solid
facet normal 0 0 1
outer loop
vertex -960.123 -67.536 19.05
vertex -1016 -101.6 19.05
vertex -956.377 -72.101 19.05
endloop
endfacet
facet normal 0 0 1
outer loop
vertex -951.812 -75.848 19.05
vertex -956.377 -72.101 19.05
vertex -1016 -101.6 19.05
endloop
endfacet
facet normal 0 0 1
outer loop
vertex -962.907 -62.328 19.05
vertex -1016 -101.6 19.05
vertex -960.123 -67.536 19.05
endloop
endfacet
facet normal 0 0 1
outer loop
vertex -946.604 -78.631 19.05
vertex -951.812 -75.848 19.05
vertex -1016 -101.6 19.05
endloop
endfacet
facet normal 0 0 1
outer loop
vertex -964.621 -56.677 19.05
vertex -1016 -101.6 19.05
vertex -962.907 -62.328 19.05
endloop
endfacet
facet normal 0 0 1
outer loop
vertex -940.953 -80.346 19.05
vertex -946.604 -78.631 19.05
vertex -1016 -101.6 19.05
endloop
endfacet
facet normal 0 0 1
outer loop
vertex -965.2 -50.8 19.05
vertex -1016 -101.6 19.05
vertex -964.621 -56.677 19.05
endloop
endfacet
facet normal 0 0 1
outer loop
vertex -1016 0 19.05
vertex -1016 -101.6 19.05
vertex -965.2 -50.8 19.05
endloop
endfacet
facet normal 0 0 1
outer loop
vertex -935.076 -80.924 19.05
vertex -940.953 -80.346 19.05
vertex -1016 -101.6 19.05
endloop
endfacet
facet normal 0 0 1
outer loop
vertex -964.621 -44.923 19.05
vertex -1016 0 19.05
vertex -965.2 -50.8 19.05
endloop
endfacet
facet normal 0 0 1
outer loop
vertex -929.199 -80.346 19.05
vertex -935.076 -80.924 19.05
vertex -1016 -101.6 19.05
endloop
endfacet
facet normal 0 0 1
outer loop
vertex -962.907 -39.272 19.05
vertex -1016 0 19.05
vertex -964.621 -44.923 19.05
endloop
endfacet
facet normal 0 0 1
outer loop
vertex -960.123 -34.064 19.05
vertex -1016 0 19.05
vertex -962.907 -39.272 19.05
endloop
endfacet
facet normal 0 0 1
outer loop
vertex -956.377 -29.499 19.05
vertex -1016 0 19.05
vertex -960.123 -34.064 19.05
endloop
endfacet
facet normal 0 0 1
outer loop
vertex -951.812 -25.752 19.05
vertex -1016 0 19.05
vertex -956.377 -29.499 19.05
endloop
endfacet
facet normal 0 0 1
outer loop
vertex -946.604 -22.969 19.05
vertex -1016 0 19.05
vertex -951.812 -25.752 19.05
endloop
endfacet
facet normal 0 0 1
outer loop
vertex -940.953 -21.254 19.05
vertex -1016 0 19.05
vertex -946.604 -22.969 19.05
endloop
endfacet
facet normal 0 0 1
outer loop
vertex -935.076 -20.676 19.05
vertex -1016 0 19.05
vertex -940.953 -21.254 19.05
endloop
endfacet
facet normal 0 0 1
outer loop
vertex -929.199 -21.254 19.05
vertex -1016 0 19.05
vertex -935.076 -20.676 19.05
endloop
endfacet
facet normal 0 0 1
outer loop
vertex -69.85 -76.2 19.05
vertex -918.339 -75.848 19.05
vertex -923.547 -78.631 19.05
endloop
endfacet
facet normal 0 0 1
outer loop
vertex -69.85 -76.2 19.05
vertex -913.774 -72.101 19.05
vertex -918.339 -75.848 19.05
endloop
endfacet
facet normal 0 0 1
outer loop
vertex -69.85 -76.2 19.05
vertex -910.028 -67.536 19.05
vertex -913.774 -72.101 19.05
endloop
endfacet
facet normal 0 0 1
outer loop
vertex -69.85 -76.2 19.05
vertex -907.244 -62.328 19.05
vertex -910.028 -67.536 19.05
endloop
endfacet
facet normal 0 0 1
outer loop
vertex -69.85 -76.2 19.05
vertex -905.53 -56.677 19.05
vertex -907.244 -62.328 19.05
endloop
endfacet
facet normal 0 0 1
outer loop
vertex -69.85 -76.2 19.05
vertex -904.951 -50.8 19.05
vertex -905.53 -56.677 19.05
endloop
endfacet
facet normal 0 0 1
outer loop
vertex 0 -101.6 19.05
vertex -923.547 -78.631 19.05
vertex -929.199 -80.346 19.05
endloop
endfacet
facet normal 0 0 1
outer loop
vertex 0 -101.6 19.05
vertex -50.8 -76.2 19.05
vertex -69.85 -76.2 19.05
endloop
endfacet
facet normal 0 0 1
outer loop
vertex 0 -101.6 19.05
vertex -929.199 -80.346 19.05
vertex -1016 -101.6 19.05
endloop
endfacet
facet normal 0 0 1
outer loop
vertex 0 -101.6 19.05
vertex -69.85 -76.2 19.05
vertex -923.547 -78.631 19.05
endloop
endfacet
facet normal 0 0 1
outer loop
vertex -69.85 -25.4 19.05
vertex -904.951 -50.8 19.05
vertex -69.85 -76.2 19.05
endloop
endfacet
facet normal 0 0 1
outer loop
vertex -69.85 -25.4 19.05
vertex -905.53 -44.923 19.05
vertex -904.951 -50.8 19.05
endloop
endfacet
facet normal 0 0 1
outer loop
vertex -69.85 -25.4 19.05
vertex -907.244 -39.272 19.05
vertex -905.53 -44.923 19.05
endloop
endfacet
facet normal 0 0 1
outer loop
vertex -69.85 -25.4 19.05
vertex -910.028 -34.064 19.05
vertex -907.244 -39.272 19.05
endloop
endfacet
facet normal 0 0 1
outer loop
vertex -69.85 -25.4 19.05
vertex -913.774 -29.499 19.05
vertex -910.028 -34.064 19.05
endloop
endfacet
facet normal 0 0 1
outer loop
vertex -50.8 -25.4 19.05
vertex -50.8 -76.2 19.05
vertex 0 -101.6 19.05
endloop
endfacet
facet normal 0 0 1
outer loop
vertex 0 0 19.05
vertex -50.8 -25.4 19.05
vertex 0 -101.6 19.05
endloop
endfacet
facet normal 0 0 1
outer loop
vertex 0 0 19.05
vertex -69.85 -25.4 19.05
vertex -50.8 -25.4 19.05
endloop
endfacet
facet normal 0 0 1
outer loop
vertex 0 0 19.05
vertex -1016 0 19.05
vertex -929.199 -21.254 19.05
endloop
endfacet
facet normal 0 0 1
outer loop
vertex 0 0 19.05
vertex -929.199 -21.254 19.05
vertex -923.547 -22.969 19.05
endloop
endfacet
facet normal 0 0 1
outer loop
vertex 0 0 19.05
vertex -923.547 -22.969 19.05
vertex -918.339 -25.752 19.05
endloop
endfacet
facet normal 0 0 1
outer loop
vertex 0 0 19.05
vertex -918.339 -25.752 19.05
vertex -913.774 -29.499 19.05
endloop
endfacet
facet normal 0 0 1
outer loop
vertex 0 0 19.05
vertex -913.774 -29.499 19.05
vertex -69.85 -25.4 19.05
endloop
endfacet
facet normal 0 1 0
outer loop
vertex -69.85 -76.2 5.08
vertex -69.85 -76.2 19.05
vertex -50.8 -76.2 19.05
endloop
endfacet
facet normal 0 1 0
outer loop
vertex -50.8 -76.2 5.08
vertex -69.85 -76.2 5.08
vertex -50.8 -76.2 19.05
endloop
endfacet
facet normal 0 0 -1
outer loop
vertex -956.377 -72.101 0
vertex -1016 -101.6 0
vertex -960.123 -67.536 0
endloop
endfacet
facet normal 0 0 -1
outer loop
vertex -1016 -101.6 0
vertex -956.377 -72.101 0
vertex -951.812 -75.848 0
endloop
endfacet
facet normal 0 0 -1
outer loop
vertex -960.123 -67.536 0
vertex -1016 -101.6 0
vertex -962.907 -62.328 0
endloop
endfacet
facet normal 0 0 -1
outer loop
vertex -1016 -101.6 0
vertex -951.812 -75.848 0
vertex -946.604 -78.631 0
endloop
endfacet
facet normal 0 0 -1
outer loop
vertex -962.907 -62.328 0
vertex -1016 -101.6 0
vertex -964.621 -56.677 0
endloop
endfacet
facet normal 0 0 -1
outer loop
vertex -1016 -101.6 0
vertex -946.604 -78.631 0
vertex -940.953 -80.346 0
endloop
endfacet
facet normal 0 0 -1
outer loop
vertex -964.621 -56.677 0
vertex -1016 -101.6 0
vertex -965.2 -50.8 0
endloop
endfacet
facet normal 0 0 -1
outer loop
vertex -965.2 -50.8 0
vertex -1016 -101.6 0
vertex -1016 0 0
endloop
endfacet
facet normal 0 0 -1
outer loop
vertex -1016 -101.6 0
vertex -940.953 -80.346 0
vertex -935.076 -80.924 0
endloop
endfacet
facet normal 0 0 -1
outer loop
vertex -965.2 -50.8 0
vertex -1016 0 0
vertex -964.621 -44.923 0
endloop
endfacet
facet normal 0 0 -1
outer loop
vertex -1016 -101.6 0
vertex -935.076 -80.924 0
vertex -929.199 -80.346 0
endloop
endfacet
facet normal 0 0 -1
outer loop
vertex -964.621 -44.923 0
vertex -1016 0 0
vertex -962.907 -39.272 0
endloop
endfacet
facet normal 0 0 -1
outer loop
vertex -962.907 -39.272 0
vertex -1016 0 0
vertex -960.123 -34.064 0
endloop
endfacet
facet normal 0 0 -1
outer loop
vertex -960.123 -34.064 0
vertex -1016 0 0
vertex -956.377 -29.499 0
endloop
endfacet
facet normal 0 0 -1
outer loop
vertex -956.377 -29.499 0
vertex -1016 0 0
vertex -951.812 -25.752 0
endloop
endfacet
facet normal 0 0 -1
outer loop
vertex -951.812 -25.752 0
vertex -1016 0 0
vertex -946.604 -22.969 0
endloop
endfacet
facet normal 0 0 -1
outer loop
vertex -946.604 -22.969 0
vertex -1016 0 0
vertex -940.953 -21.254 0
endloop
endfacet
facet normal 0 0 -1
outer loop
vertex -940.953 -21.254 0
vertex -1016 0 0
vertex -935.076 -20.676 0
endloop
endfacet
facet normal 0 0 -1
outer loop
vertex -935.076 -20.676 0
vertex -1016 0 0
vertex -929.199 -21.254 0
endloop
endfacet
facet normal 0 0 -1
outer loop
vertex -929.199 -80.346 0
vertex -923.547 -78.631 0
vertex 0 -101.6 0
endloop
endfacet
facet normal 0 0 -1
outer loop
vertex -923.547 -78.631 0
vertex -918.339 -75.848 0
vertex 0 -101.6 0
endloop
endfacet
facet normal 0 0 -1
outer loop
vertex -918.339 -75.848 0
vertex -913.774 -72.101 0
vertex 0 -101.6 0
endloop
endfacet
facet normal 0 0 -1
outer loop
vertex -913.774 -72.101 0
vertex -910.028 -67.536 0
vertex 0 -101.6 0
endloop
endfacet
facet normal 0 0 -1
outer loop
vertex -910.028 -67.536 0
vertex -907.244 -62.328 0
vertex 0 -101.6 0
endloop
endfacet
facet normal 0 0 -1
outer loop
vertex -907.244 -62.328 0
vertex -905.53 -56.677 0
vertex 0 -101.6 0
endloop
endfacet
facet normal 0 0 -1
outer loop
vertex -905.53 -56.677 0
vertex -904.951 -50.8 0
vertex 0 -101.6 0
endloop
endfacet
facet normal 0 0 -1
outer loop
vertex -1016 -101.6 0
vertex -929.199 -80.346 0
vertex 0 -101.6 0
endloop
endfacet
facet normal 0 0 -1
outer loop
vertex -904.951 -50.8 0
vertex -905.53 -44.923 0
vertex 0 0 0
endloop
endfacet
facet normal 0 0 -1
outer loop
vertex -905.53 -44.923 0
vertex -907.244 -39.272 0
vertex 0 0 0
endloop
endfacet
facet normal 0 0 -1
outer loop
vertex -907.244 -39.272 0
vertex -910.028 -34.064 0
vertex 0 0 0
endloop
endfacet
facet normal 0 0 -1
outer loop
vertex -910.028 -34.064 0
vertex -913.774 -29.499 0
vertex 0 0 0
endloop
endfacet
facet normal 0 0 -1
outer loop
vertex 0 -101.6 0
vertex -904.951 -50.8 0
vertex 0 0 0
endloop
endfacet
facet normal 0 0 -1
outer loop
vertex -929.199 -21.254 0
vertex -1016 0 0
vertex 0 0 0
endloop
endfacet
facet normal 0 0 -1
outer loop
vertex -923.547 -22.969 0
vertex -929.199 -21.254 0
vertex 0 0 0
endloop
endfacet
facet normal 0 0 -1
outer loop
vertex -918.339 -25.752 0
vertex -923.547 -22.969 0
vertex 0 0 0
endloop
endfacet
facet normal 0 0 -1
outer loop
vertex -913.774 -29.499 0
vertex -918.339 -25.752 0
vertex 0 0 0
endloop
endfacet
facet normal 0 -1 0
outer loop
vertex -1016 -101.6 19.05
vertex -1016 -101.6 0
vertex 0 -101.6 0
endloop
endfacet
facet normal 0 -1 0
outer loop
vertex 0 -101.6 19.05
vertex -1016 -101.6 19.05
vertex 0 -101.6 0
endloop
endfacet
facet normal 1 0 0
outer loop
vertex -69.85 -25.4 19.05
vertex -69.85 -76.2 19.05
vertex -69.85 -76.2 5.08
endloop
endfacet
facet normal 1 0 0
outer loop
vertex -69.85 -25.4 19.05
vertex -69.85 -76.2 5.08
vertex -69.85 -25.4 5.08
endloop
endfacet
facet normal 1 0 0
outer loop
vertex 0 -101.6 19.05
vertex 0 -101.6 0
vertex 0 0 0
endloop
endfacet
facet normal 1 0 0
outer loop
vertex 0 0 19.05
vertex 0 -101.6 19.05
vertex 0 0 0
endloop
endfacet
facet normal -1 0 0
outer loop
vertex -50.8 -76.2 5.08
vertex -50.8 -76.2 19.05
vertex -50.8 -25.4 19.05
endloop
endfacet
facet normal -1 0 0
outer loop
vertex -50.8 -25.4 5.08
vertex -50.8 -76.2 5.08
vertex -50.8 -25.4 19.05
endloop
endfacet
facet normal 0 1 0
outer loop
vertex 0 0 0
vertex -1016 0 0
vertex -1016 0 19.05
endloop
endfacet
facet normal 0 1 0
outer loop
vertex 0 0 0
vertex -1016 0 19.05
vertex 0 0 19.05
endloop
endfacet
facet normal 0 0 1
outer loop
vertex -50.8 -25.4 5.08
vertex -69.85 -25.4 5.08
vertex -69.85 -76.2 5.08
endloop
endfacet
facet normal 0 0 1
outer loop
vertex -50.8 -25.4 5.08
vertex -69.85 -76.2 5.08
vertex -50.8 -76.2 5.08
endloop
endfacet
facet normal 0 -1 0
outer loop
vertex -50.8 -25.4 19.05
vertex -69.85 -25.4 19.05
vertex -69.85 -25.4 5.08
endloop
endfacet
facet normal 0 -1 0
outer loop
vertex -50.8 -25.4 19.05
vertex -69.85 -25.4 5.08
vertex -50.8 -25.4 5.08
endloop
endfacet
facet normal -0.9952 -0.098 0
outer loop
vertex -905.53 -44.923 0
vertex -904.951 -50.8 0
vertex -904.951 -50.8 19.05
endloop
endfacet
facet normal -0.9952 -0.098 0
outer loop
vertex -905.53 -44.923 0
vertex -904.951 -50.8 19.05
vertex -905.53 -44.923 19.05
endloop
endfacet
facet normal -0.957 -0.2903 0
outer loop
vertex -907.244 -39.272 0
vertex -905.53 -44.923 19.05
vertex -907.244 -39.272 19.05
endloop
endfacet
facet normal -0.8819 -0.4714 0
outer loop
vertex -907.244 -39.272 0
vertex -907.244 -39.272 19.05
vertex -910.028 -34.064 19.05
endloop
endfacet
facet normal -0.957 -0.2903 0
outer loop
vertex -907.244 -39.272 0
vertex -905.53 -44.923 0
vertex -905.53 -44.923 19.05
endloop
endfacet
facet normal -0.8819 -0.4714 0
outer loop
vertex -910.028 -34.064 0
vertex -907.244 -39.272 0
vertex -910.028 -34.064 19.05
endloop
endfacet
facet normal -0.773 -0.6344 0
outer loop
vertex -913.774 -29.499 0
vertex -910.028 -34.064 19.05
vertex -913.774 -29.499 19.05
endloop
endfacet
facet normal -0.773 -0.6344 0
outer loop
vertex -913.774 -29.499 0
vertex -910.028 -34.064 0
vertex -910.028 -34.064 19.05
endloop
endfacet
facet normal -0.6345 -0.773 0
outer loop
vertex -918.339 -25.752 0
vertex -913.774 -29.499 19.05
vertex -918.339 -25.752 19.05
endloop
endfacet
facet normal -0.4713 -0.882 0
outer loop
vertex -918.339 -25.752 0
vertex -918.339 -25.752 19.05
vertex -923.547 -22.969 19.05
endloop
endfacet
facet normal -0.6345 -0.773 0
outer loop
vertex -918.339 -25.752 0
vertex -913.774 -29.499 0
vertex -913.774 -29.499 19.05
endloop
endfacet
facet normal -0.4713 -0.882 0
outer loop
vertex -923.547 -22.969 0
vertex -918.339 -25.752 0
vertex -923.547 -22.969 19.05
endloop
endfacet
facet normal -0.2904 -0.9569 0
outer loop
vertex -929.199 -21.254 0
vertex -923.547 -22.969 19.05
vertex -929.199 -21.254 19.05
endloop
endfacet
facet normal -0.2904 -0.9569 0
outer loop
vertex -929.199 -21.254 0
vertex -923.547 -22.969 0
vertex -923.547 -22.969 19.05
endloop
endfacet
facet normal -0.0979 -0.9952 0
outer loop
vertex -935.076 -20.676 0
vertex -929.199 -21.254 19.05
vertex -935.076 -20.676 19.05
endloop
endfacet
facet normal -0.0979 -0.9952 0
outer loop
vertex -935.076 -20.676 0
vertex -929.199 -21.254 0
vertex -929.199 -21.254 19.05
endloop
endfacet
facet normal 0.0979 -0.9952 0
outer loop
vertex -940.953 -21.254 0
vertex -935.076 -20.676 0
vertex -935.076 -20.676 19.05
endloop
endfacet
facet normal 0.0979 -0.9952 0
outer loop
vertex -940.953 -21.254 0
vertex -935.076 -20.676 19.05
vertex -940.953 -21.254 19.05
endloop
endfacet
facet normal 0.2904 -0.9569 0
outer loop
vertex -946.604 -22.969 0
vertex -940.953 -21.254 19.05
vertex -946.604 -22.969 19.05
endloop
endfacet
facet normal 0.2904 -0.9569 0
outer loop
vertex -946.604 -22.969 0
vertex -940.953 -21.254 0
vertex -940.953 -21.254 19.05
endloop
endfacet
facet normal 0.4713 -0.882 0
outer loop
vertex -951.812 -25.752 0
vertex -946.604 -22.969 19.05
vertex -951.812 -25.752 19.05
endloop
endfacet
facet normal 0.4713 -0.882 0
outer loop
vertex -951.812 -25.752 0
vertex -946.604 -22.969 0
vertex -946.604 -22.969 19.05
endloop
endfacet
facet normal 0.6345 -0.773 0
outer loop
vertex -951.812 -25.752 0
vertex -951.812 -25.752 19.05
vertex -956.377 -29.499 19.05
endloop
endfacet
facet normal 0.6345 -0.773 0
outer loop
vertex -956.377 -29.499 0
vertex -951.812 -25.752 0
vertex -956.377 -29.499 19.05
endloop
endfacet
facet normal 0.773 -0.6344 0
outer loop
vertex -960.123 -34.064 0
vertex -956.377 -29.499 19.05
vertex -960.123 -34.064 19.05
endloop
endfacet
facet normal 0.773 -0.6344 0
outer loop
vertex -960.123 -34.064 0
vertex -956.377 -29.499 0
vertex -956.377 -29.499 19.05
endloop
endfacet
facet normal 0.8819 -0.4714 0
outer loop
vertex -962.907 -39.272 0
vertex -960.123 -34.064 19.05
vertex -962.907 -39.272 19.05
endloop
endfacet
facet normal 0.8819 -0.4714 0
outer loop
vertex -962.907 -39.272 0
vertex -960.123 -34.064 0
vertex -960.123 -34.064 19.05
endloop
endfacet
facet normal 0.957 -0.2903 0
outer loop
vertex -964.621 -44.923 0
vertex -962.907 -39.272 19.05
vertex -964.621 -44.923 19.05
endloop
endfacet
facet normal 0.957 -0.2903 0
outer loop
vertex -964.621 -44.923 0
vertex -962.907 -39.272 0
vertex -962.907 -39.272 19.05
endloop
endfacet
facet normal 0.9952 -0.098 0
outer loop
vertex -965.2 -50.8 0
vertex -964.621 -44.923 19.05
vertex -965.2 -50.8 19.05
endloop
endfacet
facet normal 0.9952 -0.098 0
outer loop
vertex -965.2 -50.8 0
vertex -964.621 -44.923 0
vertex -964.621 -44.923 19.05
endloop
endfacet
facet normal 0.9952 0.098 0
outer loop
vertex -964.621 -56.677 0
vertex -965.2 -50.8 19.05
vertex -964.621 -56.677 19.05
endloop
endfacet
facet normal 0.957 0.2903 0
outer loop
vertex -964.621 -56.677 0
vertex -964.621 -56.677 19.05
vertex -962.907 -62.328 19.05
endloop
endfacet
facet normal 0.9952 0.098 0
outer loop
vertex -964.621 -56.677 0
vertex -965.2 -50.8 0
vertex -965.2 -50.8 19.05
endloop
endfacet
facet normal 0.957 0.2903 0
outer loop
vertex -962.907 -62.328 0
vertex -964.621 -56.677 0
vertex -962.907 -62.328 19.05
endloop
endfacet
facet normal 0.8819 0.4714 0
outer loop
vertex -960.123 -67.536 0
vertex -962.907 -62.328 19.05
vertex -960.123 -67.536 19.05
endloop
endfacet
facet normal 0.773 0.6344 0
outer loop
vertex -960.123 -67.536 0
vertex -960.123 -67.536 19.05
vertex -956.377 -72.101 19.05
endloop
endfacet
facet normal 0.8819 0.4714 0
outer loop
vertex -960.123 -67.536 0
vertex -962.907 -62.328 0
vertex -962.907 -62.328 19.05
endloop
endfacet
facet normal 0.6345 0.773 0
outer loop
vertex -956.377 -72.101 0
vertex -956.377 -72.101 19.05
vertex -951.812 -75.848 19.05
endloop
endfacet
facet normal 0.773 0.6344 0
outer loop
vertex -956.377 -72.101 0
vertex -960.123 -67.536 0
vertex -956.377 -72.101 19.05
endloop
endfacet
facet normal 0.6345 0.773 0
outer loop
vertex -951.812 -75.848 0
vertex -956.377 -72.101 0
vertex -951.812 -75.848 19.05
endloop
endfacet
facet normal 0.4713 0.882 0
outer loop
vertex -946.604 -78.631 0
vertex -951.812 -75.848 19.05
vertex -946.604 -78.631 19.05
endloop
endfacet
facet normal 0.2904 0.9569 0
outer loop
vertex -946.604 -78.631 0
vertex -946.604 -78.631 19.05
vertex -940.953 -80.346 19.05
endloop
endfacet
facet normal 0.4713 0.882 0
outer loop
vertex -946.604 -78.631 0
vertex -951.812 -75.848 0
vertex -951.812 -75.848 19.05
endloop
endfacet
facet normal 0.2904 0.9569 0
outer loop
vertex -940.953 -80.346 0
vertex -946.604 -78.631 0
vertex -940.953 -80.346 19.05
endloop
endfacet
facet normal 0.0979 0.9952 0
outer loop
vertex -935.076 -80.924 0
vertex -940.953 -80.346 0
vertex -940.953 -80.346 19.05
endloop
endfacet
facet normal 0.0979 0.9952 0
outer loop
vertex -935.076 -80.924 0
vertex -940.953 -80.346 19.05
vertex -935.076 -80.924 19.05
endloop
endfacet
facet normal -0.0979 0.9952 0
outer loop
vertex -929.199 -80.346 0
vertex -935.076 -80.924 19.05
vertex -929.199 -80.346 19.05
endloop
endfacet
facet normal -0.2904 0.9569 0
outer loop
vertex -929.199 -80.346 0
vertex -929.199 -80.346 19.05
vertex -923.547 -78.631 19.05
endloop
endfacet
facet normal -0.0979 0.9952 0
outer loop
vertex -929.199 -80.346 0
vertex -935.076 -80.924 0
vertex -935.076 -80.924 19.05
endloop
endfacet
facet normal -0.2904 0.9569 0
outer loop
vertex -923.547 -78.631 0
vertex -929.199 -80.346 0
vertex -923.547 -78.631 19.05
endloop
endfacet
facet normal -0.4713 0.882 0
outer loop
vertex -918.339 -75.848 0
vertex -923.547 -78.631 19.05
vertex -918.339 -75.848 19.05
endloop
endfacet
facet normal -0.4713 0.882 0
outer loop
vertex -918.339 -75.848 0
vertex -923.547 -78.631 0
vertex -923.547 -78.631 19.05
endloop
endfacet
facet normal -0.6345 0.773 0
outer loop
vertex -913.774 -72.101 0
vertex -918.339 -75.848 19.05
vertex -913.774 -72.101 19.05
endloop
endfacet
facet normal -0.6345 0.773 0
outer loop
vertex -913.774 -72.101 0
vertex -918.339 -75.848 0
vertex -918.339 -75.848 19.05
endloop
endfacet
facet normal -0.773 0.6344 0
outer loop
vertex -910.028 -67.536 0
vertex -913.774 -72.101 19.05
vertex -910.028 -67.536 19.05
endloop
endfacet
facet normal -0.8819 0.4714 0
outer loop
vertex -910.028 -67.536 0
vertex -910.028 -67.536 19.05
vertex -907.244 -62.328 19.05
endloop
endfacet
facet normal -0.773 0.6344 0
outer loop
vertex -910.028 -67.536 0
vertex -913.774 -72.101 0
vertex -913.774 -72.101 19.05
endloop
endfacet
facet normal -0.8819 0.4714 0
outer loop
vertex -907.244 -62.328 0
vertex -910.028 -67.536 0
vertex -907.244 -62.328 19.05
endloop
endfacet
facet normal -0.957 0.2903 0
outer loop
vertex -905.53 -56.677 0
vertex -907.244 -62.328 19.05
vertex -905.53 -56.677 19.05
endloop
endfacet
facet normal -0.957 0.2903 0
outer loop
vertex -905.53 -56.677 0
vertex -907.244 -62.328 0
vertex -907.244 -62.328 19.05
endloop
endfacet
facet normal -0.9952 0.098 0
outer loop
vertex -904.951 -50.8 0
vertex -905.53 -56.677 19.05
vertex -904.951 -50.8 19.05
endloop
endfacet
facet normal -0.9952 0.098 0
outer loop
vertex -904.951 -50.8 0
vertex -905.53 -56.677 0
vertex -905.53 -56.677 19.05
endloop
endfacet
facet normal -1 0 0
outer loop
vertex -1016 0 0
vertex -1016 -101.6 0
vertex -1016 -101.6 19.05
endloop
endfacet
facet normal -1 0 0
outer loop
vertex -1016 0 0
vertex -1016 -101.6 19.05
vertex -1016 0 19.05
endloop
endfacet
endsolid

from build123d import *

# Parameters (mm, degrees)
F0_W     = 1016
F0_H     = 101.6
F0_R     = 30.1244
F1_DEPTH = 19.05
F2_W     = 19.05
F2_H     = 50.8
F3_DEPTH = 13.97


with BuildPart() as f1:
    # F0 (on Top) → F1 (new body)
    with BuildSketch(Plane.XY):
        with Locations((-508, -50.8)):
            Rectangle(F0_W, F0_H)
        with Locations((-935.0756, -50.8)):
            Circle(F0_R, mode=Mode.SUBTRACT)
    extrude(amount=F1_DEPTH)

    # F2 (on face) → F3 (cut)
    with BuildSketch(Plane.XY.offset(19.05)):
        with Locations((-60.325, -50.8)):
            Rectangle(F2_W, F2_H)
    extrude(amount=-F3_DEPTH, mode=Mode.SUBTRACT)


solid = f1.part
